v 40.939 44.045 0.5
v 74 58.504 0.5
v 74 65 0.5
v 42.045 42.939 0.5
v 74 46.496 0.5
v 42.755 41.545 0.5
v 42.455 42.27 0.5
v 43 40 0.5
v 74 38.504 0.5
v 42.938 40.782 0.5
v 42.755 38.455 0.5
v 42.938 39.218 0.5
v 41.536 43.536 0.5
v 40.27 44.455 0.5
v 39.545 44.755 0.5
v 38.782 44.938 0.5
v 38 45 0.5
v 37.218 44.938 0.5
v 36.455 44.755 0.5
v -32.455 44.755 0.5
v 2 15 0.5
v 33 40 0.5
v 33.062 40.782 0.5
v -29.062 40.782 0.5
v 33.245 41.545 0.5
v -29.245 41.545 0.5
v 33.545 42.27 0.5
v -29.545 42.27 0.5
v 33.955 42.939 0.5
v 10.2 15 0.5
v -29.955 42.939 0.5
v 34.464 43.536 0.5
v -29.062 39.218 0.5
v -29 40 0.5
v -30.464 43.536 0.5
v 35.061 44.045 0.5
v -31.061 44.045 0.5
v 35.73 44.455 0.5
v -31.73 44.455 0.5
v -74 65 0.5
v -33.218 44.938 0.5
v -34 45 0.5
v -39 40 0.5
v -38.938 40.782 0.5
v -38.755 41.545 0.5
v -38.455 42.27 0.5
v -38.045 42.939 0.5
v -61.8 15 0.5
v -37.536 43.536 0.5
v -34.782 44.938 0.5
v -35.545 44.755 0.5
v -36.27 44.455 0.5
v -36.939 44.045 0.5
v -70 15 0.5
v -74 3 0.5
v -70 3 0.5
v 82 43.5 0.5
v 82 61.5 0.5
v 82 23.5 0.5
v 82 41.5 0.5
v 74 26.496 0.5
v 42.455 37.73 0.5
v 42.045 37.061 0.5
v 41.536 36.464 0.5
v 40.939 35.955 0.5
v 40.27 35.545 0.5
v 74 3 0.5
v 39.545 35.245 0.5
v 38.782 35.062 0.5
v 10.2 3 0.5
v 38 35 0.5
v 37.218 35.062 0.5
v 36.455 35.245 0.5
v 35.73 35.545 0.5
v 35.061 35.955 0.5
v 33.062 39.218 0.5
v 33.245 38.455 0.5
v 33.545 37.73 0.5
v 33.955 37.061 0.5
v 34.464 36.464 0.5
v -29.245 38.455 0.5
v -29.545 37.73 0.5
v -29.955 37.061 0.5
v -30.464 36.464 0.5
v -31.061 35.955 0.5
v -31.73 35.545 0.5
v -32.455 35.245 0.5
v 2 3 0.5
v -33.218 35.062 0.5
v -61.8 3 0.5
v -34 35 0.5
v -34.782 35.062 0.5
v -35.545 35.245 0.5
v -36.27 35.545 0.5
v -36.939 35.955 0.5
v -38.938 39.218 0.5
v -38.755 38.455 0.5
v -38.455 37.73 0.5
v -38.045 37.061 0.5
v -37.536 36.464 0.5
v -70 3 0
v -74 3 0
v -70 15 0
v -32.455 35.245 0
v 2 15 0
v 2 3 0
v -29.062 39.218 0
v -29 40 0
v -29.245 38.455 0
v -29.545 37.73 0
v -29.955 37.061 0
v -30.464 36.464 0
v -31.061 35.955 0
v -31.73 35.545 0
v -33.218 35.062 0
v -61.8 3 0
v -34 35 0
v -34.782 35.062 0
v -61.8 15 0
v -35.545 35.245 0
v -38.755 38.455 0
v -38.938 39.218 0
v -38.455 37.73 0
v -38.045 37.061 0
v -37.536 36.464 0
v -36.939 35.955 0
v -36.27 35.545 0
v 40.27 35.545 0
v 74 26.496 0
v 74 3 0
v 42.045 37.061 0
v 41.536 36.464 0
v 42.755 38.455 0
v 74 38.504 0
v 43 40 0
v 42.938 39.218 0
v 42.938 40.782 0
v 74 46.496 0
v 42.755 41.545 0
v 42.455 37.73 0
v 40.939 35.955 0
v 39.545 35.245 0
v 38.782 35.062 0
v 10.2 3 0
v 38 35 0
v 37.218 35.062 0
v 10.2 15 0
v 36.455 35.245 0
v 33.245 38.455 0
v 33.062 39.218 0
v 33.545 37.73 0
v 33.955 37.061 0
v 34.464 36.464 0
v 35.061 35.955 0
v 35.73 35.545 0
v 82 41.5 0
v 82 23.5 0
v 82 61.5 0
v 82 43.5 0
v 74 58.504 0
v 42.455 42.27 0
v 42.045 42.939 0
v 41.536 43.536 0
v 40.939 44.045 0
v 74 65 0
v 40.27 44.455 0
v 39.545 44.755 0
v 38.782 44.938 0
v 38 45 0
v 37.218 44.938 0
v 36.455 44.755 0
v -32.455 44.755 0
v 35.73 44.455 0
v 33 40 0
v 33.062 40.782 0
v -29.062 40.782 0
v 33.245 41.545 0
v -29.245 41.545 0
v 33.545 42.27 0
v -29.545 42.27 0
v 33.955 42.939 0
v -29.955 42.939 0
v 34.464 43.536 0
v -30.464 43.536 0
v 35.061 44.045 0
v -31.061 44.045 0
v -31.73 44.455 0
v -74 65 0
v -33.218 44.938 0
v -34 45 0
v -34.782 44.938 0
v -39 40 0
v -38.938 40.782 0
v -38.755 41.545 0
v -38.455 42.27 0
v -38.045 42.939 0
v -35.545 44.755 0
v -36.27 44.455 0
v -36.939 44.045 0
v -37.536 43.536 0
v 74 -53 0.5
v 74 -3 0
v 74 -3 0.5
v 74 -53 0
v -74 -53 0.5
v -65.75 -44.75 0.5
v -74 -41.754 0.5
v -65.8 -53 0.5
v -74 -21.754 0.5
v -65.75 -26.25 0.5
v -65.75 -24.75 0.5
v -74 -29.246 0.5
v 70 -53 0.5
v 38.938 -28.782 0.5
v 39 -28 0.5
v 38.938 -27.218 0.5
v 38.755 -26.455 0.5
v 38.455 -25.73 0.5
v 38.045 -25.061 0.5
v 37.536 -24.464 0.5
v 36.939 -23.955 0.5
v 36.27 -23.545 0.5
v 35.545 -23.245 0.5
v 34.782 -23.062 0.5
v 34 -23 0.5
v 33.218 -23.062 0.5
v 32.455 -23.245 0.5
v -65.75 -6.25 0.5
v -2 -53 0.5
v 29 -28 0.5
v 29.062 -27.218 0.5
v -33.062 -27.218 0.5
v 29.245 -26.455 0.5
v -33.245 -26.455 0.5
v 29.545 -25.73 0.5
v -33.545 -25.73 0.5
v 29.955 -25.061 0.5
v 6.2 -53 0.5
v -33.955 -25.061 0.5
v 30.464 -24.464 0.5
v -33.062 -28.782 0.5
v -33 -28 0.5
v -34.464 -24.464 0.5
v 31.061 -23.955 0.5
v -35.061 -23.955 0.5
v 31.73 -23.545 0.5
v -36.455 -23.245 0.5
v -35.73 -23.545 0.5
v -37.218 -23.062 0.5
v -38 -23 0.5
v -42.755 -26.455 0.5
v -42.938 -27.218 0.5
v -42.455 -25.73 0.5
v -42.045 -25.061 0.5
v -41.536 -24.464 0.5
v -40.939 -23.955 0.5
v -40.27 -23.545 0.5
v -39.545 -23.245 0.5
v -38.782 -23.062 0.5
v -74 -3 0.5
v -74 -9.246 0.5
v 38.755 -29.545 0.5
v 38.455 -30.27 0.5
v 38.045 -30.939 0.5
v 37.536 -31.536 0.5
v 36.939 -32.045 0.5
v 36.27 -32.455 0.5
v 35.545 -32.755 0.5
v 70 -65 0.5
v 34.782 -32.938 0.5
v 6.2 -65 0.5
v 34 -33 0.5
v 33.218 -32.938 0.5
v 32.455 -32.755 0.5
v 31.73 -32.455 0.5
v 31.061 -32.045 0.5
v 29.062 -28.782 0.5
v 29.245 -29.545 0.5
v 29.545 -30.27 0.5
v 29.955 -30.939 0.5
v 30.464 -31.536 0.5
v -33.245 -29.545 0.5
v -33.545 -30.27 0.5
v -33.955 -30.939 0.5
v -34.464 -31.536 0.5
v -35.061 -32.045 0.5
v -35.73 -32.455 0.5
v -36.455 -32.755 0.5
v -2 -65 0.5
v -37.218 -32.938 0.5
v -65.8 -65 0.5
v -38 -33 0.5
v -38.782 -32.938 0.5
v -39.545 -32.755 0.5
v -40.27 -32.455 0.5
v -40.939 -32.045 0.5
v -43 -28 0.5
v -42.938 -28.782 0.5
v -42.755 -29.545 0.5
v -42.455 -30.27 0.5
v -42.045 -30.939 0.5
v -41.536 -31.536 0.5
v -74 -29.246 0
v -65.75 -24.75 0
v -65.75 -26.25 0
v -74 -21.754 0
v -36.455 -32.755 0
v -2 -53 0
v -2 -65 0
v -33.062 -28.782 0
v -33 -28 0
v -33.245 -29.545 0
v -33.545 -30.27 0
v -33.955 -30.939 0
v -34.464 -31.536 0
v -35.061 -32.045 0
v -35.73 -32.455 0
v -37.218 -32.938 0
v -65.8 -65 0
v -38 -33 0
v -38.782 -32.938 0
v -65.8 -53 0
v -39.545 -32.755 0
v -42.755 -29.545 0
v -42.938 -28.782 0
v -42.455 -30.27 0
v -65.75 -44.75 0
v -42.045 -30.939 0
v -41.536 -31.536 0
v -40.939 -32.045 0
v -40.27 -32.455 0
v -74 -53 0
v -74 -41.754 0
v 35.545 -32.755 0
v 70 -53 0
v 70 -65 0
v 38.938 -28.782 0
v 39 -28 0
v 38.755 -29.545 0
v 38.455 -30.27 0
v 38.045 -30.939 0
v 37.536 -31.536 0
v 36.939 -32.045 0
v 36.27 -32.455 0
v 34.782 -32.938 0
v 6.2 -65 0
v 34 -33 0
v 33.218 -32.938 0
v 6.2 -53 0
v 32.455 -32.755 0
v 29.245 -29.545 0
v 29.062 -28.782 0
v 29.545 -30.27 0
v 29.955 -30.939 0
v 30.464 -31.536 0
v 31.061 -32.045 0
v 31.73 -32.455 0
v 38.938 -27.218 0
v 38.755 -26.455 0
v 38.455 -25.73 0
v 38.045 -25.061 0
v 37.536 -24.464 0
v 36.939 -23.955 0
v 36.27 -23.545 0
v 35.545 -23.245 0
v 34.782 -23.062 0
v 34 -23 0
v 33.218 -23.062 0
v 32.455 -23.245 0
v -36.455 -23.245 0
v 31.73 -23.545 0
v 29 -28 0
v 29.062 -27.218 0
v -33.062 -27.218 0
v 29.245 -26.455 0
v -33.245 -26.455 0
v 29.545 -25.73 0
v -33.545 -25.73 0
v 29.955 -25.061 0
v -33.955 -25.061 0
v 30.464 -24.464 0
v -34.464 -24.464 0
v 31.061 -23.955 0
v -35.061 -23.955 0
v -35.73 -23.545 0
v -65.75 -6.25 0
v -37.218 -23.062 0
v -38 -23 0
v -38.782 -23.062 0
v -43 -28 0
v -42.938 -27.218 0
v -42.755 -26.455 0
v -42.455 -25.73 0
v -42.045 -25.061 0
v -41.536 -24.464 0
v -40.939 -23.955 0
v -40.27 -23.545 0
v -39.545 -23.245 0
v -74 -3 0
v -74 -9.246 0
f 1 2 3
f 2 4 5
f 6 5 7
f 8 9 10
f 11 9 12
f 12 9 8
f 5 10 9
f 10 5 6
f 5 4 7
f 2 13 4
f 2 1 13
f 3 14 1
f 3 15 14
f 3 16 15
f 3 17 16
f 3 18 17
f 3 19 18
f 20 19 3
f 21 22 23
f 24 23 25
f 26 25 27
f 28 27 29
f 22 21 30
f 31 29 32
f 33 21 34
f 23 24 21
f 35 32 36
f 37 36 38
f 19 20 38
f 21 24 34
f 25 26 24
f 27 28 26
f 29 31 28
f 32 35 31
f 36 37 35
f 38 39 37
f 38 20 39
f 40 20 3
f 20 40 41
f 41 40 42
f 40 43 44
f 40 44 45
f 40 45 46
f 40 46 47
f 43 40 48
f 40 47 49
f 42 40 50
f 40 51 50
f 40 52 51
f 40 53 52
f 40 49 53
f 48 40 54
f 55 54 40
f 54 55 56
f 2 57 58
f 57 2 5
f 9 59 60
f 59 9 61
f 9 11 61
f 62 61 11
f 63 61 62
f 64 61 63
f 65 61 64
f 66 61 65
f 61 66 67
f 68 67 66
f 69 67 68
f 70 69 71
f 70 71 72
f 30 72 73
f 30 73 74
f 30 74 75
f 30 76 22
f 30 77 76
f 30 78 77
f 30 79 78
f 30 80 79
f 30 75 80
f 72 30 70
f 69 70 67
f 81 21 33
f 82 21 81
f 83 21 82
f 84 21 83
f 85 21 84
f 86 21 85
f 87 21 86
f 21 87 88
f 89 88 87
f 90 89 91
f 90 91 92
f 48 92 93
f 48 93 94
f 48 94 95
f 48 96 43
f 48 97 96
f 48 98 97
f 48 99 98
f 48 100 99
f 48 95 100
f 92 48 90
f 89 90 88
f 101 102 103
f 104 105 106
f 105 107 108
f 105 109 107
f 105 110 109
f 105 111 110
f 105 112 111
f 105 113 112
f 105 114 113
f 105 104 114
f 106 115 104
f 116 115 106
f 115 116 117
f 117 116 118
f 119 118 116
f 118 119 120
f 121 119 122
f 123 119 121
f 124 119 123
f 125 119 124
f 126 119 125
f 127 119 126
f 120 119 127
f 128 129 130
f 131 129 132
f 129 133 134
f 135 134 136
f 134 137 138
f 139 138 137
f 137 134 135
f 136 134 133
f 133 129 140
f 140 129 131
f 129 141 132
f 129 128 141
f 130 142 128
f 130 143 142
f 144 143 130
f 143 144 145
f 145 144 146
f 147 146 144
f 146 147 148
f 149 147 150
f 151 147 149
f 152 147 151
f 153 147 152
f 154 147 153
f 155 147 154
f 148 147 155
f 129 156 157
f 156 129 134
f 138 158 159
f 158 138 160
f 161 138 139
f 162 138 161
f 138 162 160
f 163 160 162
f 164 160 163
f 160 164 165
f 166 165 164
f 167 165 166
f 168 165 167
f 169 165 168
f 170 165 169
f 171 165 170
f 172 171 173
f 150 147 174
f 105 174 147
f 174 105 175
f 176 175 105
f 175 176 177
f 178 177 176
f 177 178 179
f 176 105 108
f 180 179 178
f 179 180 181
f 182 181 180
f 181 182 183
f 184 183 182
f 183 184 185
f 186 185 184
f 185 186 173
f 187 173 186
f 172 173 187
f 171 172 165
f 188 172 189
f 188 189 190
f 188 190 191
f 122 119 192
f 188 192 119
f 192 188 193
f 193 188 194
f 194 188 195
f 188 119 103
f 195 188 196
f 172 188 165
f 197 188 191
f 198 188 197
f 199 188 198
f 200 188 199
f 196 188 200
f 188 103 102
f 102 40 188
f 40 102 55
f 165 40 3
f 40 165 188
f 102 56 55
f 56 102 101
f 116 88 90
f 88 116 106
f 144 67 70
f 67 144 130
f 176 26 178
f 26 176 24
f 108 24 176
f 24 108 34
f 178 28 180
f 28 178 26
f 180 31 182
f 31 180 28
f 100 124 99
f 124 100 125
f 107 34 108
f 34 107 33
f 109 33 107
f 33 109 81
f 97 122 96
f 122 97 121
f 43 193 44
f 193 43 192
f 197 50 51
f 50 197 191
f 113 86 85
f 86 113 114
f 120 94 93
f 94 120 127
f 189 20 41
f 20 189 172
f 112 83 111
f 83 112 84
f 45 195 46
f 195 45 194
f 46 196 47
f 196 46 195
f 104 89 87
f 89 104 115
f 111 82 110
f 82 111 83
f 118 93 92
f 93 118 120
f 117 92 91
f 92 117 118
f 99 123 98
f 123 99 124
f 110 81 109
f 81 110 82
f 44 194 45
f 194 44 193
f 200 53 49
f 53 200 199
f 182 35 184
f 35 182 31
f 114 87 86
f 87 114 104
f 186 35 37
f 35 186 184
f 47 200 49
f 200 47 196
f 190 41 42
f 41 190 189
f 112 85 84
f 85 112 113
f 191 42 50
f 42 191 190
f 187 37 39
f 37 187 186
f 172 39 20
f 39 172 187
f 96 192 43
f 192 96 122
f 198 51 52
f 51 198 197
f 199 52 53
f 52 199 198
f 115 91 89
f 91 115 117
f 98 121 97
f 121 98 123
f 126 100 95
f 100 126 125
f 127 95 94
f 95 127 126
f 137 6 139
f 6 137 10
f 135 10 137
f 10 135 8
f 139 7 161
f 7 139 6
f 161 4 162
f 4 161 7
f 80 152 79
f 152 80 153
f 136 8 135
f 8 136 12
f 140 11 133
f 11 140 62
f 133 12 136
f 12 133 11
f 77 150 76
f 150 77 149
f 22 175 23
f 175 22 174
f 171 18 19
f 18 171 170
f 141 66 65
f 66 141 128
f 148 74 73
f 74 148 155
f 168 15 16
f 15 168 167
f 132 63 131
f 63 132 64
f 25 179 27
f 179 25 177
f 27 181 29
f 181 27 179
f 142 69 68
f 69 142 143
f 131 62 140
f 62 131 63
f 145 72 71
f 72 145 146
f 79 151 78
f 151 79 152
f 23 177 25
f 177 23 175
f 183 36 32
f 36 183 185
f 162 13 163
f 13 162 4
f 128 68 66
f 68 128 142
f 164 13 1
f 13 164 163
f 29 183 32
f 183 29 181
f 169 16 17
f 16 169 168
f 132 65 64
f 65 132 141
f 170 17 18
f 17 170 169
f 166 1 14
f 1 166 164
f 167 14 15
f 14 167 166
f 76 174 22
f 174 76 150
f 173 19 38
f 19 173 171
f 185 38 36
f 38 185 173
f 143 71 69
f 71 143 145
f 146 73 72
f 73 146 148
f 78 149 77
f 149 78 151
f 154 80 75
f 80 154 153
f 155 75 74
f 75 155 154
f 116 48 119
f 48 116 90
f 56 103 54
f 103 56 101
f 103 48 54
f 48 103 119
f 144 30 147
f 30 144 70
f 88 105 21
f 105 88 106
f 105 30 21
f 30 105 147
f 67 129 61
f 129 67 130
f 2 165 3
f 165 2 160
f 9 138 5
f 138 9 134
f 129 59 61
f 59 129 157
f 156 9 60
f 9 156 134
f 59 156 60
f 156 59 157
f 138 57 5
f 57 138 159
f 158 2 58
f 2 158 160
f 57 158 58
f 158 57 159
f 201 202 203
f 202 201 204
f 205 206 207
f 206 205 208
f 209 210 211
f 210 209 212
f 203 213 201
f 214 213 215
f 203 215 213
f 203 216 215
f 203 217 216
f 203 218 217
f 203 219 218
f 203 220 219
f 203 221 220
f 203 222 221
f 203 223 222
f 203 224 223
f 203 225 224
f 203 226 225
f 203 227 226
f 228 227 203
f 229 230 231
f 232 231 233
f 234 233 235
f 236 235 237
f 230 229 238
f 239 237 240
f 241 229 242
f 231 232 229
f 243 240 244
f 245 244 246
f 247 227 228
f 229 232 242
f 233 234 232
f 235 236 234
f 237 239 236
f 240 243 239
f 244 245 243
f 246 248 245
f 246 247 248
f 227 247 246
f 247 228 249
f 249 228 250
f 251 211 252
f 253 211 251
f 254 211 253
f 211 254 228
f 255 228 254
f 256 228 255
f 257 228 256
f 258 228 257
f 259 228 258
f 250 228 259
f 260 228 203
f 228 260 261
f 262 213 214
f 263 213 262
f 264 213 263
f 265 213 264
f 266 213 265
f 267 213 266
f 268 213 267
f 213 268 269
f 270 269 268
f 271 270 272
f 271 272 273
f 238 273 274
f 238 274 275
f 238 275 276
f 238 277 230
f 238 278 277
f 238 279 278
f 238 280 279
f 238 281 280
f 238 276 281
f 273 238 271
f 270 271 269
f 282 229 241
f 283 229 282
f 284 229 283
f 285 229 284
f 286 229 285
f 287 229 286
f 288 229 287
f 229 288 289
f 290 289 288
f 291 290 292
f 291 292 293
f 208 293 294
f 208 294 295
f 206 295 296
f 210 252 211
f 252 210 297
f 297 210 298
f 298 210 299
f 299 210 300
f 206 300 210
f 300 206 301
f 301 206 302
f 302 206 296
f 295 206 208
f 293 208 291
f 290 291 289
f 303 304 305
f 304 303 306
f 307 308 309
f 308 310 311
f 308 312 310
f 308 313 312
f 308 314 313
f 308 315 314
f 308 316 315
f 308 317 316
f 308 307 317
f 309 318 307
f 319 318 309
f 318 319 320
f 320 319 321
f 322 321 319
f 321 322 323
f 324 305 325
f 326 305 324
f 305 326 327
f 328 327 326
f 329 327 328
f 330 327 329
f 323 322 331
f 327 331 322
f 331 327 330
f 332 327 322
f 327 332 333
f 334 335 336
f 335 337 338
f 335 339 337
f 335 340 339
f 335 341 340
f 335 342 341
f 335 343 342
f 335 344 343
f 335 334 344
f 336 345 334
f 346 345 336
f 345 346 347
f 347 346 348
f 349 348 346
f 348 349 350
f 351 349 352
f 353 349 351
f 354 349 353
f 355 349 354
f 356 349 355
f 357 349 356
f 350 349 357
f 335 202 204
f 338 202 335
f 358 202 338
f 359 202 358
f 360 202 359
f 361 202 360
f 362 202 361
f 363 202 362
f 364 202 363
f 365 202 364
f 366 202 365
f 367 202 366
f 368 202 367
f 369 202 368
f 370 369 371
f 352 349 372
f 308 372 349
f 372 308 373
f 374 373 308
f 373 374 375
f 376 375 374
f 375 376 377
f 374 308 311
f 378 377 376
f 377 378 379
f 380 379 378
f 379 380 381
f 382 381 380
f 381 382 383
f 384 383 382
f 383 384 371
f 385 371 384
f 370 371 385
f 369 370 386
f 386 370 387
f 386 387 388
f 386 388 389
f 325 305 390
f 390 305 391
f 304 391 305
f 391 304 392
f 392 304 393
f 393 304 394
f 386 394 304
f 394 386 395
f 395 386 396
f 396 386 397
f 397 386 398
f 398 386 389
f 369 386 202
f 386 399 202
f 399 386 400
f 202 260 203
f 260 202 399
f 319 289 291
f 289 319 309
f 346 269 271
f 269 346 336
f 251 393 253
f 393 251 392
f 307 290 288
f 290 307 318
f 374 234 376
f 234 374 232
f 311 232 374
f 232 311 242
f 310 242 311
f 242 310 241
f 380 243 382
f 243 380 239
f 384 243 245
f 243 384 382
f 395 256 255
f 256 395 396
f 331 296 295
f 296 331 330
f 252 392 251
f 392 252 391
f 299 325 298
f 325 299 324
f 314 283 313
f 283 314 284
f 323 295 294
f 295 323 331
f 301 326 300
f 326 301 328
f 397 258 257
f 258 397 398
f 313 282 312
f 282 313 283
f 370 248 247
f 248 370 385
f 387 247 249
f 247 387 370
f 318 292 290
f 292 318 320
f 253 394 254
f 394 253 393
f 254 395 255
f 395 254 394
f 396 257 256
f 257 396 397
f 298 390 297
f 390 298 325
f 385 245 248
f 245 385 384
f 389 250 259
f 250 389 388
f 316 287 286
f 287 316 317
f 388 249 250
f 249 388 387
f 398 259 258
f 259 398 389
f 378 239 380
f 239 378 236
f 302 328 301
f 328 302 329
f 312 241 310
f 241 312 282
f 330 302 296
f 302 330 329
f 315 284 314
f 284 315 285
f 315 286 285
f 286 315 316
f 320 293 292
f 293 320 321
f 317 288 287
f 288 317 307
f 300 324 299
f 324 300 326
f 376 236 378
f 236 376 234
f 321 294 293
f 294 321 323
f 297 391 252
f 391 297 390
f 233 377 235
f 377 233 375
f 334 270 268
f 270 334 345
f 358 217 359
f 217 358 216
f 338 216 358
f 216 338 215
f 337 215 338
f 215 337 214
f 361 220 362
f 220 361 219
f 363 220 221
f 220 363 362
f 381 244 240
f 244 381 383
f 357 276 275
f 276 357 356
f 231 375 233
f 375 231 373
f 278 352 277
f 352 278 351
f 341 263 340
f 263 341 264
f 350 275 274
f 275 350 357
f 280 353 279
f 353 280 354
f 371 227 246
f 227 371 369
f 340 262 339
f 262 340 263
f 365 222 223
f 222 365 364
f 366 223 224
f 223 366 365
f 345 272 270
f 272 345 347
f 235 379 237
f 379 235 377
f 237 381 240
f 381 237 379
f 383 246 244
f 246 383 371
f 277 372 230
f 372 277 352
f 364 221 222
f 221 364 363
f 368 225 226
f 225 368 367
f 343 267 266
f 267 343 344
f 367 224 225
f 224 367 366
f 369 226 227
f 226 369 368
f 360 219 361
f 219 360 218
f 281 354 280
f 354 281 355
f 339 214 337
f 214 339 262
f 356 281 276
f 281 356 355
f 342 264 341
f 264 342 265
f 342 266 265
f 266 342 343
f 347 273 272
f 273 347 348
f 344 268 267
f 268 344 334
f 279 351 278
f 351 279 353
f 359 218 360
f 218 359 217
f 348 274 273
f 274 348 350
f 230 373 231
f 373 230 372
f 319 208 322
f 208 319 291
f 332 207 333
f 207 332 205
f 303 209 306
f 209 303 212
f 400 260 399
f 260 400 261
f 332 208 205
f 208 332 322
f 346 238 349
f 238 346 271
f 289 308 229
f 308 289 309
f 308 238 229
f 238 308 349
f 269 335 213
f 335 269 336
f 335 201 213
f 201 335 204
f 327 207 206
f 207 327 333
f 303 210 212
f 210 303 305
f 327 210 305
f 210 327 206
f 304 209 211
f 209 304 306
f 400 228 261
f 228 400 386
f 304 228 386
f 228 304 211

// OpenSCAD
include <../lib/filament-spool-roller-lib.scad>;
$fn = 40;

// Print plate 10: the bulkhead drilling template.
color("#00eaff") plate_template(0);
color("#ff17c7") plate_template(1);
